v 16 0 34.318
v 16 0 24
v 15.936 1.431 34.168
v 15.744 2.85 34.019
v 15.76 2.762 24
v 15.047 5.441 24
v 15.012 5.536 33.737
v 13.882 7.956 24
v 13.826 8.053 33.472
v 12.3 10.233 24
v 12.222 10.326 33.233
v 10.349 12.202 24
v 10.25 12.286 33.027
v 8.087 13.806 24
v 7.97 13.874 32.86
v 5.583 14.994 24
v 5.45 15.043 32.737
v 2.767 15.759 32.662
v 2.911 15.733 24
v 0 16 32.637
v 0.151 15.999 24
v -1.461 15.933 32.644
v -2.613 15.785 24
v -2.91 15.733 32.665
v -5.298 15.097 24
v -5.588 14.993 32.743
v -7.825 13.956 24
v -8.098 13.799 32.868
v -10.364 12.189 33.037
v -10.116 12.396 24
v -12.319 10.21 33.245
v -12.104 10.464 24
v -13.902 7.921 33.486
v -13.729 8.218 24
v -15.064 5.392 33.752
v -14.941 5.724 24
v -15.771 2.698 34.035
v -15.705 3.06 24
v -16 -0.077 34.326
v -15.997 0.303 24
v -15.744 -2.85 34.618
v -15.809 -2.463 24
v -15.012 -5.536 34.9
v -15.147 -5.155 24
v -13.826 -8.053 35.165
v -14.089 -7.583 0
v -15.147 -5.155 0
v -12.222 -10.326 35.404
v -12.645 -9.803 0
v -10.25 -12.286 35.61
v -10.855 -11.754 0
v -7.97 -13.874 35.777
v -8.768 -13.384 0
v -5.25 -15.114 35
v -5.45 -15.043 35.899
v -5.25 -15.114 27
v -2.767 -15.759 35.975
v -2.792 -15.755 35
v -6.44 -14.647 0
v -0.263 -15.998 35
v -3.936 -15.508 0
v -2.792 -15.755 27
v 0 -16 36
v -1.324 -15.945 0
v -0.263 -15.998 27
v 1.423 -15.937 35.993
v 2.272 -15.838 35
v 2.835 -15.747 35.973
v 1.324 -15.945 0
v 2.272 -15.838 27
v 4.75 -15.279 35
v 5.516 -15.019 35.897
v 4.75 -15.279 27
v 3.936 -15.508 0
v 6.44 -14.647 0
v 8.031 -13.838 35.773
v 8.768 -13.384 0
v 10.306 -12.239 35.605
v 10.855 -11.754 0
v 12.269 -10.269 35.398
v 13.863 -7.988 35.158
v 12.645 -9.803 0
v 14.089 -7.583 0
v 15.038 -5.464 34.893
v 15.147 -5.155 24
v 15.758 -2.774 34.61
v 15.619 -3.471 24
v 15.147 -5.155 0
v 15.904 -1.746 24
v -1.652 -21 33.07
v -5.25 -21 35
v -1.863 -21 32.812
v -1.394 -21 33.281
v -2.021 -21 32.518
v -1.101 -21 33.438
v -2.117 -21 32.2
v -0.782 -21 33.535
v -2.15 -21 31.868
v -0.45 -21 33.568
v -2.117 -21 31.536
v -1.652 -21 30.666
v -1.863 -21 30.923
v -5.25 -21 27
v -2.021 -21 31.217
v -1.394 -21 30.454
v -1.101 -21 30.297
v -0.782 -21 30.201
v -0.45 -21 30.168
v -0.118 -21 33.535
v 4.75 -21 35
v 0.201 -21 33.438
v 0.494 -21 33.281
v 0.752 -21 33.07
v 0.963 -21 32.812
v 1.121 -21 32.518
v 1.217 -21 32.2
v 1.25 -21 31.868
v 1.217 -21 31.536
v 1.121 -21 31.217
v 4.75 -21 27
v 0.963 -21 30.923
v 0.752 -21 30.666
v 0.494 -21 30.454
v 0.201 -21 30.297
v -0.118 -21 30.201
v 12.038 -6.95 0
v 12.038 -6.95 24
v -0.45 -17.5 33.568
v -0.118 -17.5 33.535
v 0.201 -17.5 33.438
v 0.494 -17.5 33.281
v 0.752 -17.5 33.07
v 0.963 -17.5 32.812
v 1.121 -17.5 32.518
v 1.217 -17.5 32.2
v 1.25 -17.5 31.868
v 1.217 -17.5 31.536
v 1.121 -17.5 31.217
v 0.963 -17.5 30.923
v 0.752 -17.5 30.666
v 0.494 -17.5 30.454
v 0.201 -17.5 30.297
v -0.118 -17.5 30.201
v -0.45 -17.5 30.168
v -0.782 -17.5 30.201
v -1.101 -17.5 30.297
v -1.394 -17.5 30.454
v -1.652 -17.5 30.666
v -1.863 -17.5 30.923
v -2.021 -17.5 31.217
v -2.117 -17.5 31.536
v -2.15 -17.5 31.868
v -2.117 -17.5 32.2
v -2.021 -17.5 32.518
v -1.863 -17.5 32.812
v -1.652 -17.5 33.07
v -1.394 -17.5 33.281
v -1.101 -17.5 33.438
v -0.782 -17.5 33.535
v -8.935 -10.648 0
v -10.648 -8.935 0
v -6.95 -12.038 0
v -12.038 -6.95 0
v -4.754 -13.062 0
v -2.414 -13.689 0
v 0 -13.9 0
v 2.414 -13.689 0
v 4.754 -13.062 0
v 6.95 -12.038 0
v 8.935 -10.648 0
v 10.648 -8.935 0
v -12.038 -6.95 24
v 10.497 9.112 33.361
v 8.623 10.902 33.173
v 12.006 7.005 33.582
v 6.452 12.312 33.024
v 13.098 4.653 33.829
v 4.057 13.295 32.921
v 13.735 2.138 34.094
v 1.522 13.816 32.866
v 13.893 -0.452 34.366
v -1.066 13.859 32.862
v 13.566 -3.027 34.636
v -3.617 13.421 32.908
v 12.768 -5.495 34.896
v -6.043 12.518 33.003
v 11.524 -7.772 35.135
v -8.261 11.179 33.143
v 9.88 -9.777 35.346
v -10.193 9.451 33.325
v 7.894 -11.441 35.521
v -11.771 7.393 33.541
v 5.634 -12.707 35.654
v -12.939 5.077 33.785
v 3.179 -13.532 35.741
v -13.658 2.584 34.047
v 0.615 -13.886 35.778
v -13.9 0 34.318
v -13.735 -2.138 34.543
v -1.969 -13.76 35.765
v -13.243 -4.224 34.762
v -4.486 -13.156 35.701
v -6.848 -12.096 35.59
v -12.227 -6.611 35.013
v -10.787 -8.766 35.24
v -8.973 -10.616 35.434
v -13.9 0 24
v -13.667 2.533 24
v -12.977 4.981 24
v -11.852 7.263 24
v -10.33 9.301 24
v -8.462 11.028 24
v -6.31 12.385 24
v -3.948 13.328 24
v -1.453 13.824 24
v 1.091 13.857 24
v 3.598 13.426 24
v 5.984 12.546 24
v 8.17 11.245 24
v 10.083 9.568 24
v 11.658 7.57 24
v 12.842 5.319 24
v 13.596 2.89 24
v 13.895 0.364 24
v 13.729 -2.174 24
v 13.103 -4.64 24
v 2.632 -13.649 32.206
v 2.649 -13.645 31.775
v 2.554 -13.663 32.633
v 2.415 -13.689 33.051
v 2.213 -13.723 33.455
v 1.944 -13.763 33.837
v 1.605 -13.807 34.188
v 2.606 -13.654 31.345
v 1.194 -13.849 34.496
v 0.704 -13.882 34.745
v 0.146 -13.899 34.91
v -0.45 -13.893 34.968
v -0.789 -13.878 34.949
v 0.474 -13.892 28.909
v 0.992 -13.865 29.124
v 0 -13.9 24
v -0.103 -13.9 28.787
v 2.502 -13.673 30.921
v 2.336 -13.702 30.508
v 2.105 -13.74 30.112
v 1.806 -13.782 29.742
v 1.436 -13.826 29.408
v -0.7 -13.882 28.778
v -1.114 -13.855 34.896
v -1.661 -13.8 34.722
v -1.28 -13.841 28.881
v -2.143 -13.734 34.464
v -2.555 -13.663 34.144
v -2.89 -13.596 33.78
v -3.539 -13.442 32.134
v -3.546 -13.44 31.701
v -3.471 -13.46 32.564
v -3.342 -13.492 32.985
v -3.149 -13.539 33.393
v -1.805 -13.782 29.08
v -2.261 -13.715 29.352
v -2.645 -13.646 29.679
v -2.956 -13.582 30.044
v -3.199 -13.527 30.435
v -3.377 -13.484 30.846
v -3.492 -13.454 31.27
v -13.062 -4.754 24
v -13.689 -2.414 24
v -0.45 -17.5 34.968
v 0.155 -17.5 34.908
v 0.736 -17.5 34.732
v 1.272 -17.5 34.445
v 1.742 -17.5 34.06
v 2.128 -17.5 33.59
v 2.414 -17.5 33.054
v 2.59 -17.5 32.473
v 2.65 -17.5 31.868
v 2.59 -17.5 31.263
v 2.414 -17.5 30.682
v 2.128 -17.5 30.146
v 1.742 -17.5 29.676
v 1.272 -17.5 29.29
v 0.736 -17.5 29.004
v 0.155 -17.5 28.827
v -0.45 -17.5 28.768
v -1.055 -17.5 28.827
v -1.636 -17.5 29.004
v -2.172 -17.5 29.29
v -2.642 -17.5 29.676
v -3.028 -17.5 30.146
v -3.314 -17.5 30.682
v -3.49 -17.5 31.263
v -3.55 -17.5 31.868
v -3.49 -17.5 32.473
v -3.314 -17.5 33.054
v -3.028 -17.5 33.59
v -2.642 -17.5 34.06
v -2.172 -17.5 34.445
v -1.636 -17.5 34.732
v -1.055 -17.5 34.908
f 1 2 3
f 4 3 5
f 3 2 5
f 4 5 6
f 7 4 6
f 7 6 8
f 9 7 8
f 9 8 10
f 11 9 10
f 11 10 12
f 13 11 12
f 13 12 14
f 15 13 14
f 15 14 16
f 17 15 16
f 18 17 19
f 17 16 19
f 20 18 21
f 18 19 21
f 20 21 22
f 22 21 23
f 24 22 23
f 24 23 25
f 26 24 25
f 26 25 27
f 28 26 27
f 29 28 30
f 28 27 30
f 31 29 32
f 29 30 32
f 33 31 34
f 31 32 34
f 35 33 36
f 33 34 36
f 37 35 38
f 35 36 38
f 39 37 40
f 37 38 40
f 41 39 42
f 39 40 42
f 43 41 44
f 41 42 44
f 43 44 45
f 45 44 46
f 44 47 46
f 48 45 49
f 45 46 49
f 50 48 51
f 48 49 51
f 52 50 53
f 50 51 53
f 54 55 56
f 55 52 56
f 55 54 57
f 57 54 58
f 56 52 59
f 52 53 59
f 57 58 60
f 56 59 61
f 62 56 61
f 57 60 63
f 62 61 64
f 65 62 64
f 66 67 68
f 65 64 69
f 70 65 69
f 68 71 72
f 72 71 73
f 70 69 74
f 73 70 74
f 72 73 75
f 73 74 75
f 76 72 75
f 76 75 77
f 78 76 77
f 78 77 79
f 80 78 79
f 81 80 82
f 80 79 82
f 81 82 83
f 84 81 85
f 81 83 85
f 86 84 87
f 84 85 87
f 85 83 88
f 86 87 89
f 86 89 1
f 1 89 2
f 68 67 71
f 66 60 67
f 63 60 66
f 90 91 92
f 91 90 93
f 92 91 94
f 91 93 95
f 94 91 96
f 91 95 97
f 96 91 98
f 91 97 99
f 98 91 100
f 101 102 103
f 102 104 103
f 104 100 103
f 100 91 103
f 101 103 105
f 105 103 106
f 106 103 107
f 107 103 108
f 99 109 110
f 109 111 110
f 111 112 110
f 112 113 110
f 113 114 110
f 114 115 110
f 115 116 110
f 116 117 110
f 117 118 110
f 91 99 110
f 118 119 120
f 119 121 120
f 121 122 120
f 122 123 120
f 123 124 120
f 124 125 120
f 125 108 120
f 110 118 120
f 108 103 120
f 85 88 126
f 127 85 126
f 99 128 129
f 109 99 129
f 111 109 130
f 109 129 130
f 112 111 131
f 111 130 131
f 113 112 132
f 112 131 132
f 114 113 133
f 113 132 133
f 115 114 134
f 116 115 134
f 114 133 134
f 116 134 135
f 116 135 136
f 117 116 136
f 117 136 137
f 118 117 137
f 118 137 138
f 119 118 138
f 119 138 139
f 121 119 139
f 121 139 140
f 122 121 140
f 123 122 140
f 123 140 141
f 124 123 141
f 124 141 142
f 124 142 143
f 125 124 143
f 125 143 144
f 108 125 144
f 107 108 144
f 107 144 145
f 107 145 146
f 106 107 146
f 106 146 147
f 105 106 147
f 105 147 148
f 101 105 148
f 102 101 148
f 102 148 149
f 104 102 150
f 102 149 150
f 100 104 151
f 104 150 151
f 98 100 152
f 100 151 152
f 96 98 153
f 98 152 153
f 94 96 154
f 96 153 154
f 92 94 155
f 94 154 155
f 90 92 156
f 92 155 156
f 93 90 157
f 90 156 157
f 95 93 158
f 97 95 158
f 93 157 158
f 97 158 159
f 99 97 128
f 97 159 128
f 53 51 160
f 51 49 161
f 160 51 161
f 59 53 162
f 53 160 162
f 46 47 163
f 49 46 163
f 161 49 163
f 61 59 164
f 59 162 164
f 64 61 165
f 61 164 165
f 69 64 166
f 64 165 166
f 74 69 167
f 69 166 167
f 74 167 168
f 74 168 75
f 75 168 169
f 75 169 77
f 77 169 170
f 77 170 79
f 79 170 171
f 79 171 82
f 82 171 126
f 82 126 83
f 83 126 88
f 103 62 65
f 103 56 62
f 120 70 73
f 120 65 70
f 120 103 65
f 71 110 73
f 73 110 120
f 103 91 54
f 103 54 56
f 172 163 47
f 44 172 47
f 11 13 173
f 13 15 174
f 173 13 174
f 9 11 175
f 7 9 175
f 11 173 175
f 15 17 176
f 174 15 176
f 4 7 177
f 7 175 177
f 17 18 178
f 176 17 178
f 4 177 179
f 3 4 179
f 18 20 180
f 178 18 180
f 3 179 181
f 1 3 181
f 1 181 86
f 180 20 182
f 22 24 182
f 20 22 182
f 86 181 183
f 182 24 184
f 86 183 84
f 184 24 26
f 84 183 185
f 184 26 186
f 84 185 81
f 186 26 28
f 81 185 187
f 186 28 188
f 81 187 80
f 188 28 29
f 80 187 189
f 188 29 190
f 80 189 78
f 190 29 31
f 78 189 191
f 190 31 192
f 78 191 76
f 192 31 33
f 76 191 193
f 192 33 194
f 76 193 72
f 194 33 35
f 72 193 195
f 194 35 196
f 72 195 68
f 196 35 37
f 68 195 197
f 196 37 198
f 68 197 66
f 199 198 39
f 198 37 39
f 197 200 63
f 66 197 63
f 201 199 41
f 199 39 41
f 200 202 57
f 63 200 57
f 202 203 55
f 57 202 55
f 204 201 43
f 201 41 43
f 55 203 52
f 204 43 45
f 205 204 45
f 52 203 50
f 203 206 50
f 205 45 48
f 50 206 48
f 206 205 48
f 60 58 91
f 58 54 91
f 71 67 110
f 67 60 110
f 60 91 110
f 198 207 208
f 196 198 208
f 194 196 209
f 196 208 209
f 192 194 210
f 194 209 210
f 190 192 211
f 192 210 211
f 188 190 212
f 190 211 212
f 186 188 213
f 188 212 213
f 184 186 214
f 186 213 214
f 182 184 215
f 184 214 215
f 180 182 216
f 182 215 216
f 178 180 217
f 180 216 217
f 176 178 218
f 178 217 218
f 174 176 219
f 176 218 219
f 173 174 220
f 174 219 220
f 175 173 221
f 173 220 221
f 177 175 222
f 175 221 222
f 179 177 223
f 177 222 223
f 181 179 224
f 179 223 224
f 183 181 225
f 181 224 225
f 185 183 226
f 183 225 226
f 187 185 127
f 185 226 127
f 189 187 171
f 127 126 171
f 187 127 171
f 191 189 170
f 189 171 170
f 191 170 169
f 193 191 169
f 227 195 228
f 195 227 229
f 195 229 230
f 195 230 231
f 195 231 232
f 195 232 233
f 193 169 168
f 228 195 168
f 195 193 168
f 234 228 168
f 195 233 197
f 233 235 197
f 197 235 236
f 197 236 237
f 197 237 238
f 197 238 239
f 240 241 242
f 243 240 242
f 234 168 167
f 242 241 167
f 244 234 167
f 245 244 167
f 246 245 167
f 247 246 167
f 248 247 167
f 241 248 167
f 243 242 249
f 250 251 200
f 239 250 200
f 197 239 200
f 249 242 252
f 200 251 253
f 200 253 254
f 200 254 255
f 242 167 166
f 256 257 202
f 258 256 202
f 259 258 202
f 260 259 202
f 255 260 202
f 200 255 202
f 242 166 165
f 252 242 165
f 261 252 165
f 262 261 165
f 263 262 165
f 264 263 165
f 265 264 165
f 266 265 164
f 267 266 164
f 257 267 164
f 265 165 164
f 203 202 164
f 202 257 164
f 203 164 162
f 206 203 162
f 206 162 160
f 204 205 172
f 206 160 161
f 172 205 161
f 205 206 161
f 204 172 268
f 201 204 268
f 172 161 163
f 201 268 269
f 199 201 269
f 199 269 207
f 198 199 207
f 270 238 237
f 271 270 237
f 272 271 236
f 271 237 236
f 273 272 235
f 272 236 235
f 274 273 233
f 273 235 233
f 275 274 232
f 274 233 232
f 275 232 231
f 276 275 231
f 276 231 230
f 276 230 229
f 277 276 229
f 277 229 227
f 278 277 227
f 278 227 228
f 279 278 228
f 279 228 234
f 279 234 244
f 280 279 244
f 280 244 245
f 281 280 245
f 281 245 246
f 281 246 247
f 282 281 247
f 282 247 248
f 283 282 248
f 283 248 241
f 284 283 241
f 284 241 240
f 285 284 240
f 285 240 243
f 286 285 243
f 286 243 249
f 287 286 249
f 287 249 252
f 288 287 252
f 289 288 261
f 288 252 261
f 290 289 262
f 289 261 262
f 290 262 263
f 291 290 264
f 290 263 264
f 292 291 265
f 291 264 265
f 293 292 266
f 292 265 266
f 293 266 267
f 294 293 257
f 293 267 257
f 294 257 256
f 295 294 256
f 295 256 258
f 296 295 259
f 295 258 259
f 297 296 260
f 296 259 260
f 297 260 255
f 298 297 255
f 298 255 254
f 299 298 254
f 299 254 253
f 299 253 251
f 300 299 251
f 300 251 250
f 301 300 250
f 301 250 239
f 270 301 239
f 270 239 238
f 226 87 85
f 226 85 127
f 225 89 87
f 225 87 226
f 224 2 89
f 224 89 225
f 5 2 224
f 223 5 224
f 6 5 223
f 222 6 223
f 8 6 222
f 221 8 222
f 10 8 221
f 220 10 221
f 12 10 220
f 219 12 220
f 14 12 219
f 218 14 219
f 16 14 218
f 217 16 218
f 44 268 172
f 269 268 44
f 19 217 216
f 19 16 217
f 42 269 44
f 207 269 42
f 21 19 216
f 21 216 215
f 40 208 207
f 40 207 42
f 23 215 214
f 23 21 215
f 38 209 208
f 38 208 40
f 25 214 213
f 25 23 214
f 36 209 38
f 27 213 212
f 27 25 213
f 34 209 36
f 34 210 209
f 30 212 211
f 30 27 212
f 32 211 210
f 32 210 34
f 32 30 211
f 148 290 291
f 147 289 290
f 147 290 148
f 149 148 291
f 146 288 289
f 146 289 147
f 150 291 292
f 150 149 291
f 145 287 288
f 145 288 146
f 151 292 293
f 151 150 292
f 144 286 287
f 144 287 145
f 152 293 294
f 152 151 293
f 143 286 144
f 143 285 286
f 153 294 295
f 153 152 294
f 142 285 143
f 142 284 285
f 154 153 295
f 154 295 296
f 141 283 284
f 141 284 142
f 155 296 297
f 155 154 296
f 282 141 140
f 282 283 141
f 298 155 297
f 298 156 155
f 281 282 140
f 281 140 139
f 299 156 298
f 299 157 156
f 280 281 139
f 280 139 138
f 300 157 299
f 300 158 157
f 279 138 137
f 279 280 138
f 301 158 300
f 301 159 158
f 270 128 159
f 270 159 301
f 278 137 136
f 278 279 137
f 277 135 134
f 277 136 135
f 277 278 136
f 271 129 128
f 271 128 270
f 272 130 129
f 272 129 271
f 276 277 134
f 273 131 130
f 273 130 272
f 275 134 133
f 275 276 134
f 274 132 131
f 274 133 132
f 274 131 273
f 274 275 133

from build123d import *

# Parameters (mm, degrees)
SKETCH1_R                = 16
BOSS_EXTRUDE1_DEPTH      = 36
SKETCH4_R                = 13.9
CUT_EXTRUDE1_DEPTH       = 43.520583251
CUT_EXTRUDE3_DEPTH       = 43.520583251
CUT_EXTRUDE3_DEPTH_BACK  = 43.520583251
BOSS_EXTRUDE2_REACH      = 56.046
BOSS_EXTRUDE2_END_RADIUS = 16
SKETCH8_W                = 10
SKETCH8_H                = 8
SKETCH7_R                = 1.7
CUT_EXTRUDE4_DEPTH       = 25
SKETCH10_R               = 3.1
CUT_EXTRUDE6_DEPTH       = 17.5
CUT_EXTRUDE7_DEPTH       = 24


with BuildPart() as part:
    # Sketch1 → Boss-Extrude1 (new body)
    with BuildSketch(Plane.XY):
        Circle(SKETCH1_R)
    extrude(amount=BOSS_EXTRUDE1_DEPTH)

    # Sketch4 → Cut-Extrude1 (cut, through all)
    with BuildSketch(Plane(origin=(0, 0, 0), x_dir=(-1, 0, 0), z_dir=(0, 0, -1))):
        Circle(SKETCH4_R)
    extrude(amount=-CUT_EXTRUDE1_DEPTH, mode=Mode.SUBTRACT)

    # Sketch6 → Cut-Extrude3 (cut, two sides: drawn at the far end of the back side and taken through both)
    with BuildSketch(Plane(origin=(0, 0, 0), x_dir=(0, 0, -1), z_dir=(1, 0, 0)).offset(-CUT_EXTRUDE3_DEPTH_BACK)):
        Polygon((-36, 16), (-32.636664471, 16), (-36, -16), align=None)
    extrude(amount=CUT_EXTRUDE3_DEPTH + CUT_EXTRUDE3_DEPTH_BACK, mode=Mode.SUBTRACT)

    # Boss-Extrude2: up to this cylinder (the profile starts outside it)
    boss_extrude2_end = Plane(origin=(0, 0, 31), z_dir=(0, 0, -1)) * Cylinder(BOSS_EXTRUDE2_END_RADIUS, 145.092, mode=Mode.PRIVATE)
    # Sketch8 → Boss-Extrude2 (add, up to the surface)
    with BuildSketch(Plane(origin=(0, -21, 0), x_dir=(1, 0, 0), z_dir=(0, 1, 0)), mode=Mode.PRIVATE) as boss_extrude2_sk1:
        with Locations((-0.25, -31)):
            Rectangle(SKETCH8_W, SKETCH8_H)
    boss_extrude2_tool1 = extrude(boss_extrude2_sk1.sketch, amount=BOSS_EXTRUDE2_REACH, mode=Mode.PRIVATE) - boss_extrude2_end
    add(boss_extrude2_tool1.solids().sort_by_distance((-0.25, -21, 31))[0])

    # Sketch7 → Cut-Extrude4 (cut)
    with BuildSketch(Plane(origin=(0, 0, 0), x_dir=(1, 0, 0), z_dir=(0, 1, 0))):
        with Locations(Location((-0.45, -31.867848556, 0), (0, 0, 270))):
            Circle(SKETCH7_R)
    extrude(amount=-CUT_EXTRUDE4_DEPTH, mode=Mode.SUBTRACT)

    # Sketch10 → Cut-Extrude6 (cut)
    with BuildSketch(Plane(origin=(0, 0, 0), x_dir=(1, 0, 0), z_dir=(0, 1, 0))):
        with Locations(Location((-0.45, -31.867848556, 0), (0, 0, 270))):
            Circle(SKETCH10_R)
    extrude(amount=-CUT_EXTRUDE6_DEPTH, mode=Mode.SUBTRACT)

    # Sketch11 → Cut-Extrude7 (cut)
    with BuildSketch(Plane(origin=(0, 0, 0), x_dir=(-1, 0, 0), z_dir=(0, 0, -1))):
        Polygon((-51.788319146, 16), (0, -13.9), (51.788319146, 16), align=None)
    extrude(amount=-CUT_EXTRUDE7_DEPTH, mode=Mode.SUBTRACT)


solid = part.part
